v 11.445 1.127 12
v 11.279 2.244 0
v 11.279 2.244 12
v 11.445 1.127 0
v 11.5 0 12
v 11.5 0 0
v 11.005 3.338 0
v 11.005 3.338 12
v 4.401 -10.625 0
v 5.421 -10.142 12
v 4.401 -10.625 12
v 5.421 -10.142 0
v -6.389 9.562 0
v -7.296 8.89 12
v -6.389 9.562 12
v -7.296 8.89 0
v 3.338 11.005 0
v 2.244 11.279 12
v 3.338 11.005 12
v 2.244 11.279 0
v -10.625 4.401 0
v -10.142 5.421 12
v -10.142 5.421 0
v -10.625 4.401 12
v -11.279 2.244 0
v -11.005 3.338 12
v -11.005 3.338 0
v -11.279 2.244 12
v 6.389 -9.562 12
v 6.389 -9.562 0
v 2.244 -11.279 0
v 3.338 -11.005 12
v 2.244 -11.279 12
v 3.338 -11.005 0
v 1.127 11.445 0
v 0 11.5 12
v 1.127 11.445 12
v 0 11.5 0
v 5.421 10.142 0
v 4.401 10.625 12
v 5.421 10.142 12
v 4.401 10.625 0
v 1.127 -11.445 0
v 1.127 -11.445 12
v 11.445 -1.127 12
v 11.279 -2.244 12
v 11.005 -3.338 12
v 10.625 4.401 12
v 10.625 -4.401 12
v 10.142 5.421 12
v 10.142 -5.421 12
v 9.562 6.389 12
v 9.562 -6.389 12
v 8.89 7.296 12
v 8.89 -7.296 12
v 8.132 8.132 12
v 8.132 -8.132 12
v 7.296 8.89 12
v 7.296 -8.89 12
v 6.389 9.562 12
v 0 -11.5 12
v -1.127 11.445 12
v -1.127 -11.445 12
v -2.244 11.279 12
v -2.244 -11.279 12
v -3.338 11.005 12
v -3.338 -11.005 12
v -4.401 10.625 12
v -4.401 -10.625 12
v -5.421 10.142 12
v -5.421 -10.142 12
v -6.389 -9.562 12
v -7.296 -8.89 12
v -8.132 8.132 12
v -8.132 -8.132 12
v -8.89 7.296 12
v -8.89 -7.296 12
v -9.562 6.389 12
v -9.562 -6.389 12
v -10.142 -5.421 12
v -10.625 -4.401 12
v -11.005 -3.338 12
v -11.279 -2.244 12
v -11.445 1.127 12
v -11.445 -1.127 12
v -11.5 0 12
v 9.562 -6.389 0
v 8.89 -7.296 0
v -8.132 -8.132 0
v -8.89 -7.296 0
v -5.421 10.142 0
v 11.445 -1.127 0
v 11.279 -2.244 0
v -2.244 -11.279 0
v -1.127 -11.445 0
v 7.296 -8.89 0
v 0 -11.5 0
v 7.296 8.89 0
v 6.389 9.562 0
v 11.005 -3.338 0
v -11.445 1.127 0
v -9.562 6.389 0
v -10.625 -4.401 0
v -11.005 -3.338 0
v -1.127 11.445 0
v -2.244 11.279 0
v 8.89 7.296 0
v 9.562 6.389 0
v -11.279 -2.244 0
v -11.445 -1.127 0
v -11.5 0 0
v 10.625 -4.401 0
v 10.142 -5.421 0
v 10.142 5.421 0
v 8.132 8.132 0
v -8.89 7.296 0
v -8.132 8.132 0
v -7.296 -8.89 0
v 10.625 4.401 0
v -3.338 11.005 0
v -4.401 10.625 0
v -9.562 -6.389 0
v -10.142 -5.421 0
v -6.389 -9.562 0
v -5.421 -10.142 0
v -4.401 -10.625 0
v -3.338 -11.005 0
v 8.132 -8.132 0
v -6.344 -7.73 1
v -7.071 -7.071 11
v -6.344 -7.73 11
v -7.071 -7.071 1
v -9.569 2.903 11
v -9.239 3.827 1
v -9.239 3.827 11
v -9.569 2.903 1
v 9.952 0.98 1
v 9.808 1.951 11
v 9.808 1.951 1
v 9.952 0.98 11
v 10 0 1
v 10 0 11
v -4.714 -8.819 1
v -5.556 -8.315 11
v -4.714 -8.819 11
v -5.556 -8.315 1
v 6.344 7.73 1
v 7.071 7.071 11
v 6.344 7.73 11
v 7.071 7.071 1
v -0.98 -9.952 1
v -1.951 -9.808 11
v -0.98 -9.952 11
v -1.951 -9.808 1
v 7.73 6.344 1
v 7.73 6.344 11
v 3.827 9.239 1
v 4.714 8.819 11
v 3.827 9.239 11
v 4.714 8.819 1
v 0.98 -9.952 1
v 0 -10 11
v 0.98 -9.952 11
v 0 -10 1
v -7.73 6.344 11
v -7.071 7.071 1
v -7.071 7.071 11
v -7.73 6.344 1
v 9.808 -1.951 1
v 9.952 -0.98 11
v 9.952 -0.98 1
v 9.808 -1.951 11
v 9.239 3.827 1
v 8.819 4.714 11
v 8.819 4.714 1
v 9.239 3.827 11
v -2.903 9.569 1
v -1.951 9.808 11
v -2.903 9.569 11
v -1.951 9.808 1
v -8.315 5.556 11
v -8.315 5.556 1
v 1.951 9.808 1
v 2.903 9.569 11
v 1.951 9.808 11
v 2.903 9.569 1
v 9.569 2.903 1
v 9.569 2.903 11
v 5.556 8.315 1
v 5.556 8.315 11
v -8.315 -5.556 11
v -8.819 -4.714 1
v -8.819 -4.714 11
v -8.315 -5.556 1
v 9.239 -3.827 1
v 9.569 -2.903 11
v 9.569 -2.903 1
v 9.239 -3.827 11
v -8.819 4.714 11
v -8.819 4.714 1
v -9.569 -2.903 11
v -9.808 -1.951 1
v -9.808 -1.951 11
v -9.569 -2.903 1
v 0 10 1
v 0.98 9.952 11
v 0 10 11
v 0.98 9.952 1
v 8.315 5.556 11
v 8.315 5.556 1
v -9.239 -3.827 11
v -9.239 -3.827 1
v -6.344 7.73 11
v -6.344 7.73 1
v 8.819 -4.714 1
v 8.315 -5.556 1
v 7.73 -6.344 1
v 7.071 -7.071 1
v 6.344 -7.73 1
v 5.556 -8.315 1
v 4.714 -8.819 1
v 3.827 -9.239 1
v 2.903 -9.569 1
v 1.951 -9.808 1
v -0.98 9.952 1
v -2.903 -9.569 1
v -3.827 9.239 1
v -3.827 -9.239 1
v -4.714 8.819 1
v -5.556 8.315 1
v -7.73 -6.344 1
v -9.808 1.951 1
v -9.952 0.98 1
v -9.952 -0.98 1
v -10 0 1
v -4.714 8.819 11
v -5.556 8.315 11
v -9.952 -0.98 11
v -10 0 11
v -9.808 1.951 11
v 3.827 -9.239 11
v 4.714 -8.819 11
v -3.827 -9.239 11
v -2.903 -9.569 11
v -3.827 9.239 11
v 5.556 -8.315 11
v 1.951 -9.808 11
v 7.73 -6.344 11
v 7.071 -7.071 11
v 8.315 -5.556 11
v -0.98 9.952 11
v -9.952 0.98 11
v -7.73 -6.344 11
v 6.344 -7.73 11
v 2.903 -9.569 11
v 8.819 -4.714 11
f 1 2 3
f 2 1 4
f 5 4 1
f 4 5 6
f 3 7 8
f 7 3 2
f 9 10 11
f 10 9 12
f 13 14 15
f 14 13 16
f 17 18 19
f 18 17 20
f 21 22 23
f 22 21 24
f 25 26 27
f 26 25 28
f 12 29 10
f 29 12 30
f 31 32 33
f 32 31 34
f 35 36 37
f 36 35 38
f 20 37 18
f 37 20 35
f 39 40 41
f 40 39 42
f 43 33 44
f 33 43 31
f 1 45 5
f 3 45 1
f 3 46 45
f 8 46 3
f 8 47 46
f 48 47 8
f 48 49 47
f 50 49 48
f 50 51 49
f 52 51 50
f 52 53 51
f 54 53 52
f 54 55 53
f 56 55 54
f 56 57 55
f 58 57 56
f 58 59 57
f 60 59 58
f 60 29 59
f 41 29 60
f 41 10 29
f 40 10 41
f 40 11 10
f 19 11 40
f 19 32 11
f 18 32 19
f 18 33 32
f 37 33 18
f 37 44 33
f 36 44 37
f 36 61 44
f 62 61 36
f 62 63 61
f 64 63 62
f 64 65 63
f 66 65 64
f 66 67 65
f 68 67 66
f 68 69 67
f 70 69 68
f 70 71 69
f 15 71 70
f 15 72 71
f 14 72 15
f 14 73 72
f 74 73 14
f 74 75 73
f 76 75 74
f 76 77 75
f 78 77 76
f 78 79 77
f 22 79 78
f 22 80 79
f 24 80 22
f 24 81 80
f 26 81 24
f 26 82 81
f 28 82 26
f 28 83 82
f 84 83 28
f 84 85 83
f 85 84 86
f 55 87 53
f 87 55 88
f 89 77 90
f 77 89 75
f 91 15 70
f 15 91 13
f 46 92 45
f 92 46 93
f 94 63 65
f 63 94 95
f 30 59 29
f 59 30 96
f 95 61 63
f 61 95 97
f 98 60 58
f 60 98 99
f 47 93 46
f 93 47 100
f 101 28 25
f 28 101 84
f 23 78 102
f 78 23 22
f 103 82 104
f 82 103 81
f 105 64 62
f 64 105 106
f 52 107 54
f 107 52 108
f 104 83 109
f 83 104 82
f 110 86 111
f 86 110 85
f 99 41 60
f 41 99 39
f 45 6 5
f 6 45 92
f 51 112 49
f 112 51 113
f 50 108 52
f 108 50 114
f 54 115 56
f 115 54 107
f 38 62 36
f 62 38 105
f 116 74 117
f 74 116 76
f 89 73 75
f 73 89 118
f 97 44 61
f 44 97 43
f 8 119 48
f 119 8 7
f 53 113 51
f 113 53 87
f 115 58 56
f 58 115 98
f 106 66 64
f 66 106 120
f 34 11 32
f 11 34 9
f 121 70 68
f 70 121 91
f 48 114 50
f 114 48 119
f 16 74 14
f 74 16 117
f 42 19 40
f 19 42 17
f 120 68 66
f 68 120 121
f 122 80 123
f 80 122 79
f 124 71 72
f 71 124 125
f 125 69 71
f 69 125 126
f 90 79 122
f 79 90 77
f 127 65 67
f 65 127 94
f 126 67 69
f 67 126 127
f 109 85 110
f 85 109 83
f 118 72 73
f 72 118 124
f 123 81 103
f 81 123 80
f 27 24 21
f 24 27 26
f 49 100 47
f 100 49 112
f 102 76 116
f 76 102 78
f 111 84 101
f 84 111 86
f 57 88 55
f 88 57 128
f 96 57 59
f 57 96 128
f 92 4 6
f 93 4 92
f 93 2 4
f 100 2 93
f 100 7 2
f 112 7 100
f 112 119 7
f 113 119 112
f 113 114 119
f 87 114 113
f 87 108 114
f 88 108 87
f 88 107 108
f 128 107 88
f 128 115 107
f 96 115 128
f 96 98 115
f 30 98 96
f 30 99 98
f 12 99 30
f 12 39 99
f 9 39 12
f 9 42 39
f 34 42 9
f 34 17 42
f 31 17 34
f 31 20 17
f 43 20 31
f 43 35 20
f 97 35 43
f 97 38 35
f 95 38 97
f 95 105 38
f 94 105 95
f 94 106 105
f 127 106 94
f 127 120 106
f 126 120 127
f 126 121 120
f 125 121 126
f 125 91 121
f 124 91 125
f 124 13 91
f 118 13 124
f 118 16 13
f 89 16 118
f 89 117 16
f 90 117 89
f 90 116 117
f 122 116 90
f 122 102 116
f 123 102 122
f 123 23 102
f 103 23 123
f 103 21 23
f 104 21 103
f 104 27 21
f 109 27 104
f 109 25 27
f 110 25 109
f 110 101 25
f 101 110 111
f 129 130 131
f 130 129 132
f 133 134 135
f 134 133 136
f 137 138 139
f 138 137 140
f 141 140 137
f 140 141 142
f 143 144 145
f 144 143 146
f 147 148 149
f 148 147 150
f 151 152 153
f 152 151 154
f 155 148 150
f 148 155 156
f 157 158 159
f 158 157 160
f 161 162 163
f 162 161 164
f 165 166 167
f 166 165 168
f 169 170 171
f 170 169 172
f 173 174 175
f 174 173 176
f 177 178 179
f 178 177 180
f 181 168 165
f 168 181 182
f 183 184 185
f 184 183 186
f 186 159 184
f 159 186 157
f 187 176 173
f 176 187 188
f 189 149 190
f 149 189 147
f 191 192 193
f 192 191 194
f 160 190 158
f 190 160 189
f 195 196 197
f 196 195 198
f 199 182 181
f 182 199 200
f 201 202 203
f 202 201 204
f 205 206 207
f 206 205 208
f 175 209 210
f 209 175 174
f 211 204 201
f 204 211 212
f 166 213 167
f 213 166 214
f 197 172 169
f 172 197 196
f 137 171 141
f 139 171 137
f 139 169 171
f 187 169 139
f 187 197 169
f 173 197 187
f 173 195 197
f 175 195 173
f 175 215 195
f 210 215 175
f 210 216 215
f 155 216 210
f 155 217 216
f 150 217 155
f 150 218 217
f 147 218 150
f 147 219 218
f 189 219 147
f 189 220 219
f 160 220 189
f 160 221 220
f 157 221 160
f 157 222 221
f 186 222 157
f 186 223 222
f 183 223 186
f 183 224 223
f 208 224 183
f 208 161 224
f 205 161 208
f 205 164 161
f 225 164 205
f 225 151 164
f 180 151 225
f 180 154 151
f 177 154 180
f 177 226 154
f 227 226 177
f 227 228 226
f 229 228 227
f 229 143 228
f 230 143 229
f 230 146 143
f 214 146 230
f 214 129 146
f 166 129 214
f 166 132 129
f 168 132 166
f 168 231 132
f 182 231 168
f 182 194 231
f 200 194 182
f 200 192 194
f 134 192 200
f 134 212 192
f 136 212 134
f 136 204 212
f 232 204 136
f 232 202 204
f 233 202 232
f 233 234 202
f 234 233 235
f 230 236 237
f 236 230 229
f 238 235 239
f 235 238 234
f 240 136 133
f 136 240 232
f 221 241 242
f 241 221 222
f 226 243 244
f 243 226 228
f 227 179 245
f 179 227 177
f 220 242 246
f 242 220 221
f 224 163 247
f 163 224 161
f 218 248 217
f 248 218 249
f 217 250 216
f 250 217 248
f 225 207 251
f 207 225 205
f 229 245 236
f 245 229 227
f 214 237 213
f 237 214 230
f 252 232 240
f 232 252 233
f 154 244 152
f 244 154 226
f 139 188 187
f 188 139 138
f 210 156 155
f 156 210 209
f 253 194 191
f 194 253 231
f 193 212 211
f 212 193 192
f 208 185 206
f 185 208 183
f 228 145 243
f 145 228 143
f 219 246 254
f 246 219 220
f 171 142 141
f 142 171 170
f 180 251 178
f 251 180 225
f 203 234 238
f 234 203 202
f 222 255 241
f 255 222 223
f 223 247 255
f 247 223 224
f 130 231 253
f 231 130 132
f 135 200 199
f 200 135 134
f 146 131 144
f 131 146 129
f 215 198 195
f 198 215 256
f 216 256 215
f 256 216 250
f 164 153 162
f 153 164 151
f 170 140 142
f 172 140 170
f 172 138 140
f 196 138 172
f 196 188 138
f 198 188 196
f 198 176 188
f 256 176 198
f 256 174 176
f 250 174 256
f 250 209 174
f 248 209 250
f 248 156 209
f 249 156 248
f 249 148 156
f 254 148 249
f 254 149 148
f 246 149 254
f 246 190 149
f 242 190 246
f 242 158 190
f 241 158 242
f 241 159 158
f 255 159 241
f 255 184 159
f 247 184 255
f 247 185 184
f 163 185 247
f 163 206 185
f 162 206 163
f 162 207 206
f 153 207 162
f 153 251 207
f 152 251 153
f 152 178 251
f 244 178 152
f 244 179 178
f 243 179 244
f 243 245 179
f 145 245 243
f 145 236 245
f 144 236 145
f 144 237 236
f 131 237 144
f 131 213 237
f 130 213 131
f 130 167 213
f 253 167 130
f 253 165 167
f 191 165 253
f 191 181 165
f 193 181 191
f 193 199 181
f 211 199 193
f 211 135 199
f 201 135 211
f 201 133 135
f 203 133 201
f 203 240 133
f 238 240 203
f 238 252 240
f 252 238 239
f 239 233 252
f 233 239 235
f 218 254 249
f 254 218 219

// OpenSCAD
module brushless_dc_motor() {
    difference() {
        // Outer casing of the motor
        cylinder(h=12.0, d=23.0, $fn=64);
        
        // Hollow inside for the stator
        translate([0, 0, 1])
            cylinder(h=10.0, d=20.0, $fn=64);
    }
}

brushless_dc_motor();
